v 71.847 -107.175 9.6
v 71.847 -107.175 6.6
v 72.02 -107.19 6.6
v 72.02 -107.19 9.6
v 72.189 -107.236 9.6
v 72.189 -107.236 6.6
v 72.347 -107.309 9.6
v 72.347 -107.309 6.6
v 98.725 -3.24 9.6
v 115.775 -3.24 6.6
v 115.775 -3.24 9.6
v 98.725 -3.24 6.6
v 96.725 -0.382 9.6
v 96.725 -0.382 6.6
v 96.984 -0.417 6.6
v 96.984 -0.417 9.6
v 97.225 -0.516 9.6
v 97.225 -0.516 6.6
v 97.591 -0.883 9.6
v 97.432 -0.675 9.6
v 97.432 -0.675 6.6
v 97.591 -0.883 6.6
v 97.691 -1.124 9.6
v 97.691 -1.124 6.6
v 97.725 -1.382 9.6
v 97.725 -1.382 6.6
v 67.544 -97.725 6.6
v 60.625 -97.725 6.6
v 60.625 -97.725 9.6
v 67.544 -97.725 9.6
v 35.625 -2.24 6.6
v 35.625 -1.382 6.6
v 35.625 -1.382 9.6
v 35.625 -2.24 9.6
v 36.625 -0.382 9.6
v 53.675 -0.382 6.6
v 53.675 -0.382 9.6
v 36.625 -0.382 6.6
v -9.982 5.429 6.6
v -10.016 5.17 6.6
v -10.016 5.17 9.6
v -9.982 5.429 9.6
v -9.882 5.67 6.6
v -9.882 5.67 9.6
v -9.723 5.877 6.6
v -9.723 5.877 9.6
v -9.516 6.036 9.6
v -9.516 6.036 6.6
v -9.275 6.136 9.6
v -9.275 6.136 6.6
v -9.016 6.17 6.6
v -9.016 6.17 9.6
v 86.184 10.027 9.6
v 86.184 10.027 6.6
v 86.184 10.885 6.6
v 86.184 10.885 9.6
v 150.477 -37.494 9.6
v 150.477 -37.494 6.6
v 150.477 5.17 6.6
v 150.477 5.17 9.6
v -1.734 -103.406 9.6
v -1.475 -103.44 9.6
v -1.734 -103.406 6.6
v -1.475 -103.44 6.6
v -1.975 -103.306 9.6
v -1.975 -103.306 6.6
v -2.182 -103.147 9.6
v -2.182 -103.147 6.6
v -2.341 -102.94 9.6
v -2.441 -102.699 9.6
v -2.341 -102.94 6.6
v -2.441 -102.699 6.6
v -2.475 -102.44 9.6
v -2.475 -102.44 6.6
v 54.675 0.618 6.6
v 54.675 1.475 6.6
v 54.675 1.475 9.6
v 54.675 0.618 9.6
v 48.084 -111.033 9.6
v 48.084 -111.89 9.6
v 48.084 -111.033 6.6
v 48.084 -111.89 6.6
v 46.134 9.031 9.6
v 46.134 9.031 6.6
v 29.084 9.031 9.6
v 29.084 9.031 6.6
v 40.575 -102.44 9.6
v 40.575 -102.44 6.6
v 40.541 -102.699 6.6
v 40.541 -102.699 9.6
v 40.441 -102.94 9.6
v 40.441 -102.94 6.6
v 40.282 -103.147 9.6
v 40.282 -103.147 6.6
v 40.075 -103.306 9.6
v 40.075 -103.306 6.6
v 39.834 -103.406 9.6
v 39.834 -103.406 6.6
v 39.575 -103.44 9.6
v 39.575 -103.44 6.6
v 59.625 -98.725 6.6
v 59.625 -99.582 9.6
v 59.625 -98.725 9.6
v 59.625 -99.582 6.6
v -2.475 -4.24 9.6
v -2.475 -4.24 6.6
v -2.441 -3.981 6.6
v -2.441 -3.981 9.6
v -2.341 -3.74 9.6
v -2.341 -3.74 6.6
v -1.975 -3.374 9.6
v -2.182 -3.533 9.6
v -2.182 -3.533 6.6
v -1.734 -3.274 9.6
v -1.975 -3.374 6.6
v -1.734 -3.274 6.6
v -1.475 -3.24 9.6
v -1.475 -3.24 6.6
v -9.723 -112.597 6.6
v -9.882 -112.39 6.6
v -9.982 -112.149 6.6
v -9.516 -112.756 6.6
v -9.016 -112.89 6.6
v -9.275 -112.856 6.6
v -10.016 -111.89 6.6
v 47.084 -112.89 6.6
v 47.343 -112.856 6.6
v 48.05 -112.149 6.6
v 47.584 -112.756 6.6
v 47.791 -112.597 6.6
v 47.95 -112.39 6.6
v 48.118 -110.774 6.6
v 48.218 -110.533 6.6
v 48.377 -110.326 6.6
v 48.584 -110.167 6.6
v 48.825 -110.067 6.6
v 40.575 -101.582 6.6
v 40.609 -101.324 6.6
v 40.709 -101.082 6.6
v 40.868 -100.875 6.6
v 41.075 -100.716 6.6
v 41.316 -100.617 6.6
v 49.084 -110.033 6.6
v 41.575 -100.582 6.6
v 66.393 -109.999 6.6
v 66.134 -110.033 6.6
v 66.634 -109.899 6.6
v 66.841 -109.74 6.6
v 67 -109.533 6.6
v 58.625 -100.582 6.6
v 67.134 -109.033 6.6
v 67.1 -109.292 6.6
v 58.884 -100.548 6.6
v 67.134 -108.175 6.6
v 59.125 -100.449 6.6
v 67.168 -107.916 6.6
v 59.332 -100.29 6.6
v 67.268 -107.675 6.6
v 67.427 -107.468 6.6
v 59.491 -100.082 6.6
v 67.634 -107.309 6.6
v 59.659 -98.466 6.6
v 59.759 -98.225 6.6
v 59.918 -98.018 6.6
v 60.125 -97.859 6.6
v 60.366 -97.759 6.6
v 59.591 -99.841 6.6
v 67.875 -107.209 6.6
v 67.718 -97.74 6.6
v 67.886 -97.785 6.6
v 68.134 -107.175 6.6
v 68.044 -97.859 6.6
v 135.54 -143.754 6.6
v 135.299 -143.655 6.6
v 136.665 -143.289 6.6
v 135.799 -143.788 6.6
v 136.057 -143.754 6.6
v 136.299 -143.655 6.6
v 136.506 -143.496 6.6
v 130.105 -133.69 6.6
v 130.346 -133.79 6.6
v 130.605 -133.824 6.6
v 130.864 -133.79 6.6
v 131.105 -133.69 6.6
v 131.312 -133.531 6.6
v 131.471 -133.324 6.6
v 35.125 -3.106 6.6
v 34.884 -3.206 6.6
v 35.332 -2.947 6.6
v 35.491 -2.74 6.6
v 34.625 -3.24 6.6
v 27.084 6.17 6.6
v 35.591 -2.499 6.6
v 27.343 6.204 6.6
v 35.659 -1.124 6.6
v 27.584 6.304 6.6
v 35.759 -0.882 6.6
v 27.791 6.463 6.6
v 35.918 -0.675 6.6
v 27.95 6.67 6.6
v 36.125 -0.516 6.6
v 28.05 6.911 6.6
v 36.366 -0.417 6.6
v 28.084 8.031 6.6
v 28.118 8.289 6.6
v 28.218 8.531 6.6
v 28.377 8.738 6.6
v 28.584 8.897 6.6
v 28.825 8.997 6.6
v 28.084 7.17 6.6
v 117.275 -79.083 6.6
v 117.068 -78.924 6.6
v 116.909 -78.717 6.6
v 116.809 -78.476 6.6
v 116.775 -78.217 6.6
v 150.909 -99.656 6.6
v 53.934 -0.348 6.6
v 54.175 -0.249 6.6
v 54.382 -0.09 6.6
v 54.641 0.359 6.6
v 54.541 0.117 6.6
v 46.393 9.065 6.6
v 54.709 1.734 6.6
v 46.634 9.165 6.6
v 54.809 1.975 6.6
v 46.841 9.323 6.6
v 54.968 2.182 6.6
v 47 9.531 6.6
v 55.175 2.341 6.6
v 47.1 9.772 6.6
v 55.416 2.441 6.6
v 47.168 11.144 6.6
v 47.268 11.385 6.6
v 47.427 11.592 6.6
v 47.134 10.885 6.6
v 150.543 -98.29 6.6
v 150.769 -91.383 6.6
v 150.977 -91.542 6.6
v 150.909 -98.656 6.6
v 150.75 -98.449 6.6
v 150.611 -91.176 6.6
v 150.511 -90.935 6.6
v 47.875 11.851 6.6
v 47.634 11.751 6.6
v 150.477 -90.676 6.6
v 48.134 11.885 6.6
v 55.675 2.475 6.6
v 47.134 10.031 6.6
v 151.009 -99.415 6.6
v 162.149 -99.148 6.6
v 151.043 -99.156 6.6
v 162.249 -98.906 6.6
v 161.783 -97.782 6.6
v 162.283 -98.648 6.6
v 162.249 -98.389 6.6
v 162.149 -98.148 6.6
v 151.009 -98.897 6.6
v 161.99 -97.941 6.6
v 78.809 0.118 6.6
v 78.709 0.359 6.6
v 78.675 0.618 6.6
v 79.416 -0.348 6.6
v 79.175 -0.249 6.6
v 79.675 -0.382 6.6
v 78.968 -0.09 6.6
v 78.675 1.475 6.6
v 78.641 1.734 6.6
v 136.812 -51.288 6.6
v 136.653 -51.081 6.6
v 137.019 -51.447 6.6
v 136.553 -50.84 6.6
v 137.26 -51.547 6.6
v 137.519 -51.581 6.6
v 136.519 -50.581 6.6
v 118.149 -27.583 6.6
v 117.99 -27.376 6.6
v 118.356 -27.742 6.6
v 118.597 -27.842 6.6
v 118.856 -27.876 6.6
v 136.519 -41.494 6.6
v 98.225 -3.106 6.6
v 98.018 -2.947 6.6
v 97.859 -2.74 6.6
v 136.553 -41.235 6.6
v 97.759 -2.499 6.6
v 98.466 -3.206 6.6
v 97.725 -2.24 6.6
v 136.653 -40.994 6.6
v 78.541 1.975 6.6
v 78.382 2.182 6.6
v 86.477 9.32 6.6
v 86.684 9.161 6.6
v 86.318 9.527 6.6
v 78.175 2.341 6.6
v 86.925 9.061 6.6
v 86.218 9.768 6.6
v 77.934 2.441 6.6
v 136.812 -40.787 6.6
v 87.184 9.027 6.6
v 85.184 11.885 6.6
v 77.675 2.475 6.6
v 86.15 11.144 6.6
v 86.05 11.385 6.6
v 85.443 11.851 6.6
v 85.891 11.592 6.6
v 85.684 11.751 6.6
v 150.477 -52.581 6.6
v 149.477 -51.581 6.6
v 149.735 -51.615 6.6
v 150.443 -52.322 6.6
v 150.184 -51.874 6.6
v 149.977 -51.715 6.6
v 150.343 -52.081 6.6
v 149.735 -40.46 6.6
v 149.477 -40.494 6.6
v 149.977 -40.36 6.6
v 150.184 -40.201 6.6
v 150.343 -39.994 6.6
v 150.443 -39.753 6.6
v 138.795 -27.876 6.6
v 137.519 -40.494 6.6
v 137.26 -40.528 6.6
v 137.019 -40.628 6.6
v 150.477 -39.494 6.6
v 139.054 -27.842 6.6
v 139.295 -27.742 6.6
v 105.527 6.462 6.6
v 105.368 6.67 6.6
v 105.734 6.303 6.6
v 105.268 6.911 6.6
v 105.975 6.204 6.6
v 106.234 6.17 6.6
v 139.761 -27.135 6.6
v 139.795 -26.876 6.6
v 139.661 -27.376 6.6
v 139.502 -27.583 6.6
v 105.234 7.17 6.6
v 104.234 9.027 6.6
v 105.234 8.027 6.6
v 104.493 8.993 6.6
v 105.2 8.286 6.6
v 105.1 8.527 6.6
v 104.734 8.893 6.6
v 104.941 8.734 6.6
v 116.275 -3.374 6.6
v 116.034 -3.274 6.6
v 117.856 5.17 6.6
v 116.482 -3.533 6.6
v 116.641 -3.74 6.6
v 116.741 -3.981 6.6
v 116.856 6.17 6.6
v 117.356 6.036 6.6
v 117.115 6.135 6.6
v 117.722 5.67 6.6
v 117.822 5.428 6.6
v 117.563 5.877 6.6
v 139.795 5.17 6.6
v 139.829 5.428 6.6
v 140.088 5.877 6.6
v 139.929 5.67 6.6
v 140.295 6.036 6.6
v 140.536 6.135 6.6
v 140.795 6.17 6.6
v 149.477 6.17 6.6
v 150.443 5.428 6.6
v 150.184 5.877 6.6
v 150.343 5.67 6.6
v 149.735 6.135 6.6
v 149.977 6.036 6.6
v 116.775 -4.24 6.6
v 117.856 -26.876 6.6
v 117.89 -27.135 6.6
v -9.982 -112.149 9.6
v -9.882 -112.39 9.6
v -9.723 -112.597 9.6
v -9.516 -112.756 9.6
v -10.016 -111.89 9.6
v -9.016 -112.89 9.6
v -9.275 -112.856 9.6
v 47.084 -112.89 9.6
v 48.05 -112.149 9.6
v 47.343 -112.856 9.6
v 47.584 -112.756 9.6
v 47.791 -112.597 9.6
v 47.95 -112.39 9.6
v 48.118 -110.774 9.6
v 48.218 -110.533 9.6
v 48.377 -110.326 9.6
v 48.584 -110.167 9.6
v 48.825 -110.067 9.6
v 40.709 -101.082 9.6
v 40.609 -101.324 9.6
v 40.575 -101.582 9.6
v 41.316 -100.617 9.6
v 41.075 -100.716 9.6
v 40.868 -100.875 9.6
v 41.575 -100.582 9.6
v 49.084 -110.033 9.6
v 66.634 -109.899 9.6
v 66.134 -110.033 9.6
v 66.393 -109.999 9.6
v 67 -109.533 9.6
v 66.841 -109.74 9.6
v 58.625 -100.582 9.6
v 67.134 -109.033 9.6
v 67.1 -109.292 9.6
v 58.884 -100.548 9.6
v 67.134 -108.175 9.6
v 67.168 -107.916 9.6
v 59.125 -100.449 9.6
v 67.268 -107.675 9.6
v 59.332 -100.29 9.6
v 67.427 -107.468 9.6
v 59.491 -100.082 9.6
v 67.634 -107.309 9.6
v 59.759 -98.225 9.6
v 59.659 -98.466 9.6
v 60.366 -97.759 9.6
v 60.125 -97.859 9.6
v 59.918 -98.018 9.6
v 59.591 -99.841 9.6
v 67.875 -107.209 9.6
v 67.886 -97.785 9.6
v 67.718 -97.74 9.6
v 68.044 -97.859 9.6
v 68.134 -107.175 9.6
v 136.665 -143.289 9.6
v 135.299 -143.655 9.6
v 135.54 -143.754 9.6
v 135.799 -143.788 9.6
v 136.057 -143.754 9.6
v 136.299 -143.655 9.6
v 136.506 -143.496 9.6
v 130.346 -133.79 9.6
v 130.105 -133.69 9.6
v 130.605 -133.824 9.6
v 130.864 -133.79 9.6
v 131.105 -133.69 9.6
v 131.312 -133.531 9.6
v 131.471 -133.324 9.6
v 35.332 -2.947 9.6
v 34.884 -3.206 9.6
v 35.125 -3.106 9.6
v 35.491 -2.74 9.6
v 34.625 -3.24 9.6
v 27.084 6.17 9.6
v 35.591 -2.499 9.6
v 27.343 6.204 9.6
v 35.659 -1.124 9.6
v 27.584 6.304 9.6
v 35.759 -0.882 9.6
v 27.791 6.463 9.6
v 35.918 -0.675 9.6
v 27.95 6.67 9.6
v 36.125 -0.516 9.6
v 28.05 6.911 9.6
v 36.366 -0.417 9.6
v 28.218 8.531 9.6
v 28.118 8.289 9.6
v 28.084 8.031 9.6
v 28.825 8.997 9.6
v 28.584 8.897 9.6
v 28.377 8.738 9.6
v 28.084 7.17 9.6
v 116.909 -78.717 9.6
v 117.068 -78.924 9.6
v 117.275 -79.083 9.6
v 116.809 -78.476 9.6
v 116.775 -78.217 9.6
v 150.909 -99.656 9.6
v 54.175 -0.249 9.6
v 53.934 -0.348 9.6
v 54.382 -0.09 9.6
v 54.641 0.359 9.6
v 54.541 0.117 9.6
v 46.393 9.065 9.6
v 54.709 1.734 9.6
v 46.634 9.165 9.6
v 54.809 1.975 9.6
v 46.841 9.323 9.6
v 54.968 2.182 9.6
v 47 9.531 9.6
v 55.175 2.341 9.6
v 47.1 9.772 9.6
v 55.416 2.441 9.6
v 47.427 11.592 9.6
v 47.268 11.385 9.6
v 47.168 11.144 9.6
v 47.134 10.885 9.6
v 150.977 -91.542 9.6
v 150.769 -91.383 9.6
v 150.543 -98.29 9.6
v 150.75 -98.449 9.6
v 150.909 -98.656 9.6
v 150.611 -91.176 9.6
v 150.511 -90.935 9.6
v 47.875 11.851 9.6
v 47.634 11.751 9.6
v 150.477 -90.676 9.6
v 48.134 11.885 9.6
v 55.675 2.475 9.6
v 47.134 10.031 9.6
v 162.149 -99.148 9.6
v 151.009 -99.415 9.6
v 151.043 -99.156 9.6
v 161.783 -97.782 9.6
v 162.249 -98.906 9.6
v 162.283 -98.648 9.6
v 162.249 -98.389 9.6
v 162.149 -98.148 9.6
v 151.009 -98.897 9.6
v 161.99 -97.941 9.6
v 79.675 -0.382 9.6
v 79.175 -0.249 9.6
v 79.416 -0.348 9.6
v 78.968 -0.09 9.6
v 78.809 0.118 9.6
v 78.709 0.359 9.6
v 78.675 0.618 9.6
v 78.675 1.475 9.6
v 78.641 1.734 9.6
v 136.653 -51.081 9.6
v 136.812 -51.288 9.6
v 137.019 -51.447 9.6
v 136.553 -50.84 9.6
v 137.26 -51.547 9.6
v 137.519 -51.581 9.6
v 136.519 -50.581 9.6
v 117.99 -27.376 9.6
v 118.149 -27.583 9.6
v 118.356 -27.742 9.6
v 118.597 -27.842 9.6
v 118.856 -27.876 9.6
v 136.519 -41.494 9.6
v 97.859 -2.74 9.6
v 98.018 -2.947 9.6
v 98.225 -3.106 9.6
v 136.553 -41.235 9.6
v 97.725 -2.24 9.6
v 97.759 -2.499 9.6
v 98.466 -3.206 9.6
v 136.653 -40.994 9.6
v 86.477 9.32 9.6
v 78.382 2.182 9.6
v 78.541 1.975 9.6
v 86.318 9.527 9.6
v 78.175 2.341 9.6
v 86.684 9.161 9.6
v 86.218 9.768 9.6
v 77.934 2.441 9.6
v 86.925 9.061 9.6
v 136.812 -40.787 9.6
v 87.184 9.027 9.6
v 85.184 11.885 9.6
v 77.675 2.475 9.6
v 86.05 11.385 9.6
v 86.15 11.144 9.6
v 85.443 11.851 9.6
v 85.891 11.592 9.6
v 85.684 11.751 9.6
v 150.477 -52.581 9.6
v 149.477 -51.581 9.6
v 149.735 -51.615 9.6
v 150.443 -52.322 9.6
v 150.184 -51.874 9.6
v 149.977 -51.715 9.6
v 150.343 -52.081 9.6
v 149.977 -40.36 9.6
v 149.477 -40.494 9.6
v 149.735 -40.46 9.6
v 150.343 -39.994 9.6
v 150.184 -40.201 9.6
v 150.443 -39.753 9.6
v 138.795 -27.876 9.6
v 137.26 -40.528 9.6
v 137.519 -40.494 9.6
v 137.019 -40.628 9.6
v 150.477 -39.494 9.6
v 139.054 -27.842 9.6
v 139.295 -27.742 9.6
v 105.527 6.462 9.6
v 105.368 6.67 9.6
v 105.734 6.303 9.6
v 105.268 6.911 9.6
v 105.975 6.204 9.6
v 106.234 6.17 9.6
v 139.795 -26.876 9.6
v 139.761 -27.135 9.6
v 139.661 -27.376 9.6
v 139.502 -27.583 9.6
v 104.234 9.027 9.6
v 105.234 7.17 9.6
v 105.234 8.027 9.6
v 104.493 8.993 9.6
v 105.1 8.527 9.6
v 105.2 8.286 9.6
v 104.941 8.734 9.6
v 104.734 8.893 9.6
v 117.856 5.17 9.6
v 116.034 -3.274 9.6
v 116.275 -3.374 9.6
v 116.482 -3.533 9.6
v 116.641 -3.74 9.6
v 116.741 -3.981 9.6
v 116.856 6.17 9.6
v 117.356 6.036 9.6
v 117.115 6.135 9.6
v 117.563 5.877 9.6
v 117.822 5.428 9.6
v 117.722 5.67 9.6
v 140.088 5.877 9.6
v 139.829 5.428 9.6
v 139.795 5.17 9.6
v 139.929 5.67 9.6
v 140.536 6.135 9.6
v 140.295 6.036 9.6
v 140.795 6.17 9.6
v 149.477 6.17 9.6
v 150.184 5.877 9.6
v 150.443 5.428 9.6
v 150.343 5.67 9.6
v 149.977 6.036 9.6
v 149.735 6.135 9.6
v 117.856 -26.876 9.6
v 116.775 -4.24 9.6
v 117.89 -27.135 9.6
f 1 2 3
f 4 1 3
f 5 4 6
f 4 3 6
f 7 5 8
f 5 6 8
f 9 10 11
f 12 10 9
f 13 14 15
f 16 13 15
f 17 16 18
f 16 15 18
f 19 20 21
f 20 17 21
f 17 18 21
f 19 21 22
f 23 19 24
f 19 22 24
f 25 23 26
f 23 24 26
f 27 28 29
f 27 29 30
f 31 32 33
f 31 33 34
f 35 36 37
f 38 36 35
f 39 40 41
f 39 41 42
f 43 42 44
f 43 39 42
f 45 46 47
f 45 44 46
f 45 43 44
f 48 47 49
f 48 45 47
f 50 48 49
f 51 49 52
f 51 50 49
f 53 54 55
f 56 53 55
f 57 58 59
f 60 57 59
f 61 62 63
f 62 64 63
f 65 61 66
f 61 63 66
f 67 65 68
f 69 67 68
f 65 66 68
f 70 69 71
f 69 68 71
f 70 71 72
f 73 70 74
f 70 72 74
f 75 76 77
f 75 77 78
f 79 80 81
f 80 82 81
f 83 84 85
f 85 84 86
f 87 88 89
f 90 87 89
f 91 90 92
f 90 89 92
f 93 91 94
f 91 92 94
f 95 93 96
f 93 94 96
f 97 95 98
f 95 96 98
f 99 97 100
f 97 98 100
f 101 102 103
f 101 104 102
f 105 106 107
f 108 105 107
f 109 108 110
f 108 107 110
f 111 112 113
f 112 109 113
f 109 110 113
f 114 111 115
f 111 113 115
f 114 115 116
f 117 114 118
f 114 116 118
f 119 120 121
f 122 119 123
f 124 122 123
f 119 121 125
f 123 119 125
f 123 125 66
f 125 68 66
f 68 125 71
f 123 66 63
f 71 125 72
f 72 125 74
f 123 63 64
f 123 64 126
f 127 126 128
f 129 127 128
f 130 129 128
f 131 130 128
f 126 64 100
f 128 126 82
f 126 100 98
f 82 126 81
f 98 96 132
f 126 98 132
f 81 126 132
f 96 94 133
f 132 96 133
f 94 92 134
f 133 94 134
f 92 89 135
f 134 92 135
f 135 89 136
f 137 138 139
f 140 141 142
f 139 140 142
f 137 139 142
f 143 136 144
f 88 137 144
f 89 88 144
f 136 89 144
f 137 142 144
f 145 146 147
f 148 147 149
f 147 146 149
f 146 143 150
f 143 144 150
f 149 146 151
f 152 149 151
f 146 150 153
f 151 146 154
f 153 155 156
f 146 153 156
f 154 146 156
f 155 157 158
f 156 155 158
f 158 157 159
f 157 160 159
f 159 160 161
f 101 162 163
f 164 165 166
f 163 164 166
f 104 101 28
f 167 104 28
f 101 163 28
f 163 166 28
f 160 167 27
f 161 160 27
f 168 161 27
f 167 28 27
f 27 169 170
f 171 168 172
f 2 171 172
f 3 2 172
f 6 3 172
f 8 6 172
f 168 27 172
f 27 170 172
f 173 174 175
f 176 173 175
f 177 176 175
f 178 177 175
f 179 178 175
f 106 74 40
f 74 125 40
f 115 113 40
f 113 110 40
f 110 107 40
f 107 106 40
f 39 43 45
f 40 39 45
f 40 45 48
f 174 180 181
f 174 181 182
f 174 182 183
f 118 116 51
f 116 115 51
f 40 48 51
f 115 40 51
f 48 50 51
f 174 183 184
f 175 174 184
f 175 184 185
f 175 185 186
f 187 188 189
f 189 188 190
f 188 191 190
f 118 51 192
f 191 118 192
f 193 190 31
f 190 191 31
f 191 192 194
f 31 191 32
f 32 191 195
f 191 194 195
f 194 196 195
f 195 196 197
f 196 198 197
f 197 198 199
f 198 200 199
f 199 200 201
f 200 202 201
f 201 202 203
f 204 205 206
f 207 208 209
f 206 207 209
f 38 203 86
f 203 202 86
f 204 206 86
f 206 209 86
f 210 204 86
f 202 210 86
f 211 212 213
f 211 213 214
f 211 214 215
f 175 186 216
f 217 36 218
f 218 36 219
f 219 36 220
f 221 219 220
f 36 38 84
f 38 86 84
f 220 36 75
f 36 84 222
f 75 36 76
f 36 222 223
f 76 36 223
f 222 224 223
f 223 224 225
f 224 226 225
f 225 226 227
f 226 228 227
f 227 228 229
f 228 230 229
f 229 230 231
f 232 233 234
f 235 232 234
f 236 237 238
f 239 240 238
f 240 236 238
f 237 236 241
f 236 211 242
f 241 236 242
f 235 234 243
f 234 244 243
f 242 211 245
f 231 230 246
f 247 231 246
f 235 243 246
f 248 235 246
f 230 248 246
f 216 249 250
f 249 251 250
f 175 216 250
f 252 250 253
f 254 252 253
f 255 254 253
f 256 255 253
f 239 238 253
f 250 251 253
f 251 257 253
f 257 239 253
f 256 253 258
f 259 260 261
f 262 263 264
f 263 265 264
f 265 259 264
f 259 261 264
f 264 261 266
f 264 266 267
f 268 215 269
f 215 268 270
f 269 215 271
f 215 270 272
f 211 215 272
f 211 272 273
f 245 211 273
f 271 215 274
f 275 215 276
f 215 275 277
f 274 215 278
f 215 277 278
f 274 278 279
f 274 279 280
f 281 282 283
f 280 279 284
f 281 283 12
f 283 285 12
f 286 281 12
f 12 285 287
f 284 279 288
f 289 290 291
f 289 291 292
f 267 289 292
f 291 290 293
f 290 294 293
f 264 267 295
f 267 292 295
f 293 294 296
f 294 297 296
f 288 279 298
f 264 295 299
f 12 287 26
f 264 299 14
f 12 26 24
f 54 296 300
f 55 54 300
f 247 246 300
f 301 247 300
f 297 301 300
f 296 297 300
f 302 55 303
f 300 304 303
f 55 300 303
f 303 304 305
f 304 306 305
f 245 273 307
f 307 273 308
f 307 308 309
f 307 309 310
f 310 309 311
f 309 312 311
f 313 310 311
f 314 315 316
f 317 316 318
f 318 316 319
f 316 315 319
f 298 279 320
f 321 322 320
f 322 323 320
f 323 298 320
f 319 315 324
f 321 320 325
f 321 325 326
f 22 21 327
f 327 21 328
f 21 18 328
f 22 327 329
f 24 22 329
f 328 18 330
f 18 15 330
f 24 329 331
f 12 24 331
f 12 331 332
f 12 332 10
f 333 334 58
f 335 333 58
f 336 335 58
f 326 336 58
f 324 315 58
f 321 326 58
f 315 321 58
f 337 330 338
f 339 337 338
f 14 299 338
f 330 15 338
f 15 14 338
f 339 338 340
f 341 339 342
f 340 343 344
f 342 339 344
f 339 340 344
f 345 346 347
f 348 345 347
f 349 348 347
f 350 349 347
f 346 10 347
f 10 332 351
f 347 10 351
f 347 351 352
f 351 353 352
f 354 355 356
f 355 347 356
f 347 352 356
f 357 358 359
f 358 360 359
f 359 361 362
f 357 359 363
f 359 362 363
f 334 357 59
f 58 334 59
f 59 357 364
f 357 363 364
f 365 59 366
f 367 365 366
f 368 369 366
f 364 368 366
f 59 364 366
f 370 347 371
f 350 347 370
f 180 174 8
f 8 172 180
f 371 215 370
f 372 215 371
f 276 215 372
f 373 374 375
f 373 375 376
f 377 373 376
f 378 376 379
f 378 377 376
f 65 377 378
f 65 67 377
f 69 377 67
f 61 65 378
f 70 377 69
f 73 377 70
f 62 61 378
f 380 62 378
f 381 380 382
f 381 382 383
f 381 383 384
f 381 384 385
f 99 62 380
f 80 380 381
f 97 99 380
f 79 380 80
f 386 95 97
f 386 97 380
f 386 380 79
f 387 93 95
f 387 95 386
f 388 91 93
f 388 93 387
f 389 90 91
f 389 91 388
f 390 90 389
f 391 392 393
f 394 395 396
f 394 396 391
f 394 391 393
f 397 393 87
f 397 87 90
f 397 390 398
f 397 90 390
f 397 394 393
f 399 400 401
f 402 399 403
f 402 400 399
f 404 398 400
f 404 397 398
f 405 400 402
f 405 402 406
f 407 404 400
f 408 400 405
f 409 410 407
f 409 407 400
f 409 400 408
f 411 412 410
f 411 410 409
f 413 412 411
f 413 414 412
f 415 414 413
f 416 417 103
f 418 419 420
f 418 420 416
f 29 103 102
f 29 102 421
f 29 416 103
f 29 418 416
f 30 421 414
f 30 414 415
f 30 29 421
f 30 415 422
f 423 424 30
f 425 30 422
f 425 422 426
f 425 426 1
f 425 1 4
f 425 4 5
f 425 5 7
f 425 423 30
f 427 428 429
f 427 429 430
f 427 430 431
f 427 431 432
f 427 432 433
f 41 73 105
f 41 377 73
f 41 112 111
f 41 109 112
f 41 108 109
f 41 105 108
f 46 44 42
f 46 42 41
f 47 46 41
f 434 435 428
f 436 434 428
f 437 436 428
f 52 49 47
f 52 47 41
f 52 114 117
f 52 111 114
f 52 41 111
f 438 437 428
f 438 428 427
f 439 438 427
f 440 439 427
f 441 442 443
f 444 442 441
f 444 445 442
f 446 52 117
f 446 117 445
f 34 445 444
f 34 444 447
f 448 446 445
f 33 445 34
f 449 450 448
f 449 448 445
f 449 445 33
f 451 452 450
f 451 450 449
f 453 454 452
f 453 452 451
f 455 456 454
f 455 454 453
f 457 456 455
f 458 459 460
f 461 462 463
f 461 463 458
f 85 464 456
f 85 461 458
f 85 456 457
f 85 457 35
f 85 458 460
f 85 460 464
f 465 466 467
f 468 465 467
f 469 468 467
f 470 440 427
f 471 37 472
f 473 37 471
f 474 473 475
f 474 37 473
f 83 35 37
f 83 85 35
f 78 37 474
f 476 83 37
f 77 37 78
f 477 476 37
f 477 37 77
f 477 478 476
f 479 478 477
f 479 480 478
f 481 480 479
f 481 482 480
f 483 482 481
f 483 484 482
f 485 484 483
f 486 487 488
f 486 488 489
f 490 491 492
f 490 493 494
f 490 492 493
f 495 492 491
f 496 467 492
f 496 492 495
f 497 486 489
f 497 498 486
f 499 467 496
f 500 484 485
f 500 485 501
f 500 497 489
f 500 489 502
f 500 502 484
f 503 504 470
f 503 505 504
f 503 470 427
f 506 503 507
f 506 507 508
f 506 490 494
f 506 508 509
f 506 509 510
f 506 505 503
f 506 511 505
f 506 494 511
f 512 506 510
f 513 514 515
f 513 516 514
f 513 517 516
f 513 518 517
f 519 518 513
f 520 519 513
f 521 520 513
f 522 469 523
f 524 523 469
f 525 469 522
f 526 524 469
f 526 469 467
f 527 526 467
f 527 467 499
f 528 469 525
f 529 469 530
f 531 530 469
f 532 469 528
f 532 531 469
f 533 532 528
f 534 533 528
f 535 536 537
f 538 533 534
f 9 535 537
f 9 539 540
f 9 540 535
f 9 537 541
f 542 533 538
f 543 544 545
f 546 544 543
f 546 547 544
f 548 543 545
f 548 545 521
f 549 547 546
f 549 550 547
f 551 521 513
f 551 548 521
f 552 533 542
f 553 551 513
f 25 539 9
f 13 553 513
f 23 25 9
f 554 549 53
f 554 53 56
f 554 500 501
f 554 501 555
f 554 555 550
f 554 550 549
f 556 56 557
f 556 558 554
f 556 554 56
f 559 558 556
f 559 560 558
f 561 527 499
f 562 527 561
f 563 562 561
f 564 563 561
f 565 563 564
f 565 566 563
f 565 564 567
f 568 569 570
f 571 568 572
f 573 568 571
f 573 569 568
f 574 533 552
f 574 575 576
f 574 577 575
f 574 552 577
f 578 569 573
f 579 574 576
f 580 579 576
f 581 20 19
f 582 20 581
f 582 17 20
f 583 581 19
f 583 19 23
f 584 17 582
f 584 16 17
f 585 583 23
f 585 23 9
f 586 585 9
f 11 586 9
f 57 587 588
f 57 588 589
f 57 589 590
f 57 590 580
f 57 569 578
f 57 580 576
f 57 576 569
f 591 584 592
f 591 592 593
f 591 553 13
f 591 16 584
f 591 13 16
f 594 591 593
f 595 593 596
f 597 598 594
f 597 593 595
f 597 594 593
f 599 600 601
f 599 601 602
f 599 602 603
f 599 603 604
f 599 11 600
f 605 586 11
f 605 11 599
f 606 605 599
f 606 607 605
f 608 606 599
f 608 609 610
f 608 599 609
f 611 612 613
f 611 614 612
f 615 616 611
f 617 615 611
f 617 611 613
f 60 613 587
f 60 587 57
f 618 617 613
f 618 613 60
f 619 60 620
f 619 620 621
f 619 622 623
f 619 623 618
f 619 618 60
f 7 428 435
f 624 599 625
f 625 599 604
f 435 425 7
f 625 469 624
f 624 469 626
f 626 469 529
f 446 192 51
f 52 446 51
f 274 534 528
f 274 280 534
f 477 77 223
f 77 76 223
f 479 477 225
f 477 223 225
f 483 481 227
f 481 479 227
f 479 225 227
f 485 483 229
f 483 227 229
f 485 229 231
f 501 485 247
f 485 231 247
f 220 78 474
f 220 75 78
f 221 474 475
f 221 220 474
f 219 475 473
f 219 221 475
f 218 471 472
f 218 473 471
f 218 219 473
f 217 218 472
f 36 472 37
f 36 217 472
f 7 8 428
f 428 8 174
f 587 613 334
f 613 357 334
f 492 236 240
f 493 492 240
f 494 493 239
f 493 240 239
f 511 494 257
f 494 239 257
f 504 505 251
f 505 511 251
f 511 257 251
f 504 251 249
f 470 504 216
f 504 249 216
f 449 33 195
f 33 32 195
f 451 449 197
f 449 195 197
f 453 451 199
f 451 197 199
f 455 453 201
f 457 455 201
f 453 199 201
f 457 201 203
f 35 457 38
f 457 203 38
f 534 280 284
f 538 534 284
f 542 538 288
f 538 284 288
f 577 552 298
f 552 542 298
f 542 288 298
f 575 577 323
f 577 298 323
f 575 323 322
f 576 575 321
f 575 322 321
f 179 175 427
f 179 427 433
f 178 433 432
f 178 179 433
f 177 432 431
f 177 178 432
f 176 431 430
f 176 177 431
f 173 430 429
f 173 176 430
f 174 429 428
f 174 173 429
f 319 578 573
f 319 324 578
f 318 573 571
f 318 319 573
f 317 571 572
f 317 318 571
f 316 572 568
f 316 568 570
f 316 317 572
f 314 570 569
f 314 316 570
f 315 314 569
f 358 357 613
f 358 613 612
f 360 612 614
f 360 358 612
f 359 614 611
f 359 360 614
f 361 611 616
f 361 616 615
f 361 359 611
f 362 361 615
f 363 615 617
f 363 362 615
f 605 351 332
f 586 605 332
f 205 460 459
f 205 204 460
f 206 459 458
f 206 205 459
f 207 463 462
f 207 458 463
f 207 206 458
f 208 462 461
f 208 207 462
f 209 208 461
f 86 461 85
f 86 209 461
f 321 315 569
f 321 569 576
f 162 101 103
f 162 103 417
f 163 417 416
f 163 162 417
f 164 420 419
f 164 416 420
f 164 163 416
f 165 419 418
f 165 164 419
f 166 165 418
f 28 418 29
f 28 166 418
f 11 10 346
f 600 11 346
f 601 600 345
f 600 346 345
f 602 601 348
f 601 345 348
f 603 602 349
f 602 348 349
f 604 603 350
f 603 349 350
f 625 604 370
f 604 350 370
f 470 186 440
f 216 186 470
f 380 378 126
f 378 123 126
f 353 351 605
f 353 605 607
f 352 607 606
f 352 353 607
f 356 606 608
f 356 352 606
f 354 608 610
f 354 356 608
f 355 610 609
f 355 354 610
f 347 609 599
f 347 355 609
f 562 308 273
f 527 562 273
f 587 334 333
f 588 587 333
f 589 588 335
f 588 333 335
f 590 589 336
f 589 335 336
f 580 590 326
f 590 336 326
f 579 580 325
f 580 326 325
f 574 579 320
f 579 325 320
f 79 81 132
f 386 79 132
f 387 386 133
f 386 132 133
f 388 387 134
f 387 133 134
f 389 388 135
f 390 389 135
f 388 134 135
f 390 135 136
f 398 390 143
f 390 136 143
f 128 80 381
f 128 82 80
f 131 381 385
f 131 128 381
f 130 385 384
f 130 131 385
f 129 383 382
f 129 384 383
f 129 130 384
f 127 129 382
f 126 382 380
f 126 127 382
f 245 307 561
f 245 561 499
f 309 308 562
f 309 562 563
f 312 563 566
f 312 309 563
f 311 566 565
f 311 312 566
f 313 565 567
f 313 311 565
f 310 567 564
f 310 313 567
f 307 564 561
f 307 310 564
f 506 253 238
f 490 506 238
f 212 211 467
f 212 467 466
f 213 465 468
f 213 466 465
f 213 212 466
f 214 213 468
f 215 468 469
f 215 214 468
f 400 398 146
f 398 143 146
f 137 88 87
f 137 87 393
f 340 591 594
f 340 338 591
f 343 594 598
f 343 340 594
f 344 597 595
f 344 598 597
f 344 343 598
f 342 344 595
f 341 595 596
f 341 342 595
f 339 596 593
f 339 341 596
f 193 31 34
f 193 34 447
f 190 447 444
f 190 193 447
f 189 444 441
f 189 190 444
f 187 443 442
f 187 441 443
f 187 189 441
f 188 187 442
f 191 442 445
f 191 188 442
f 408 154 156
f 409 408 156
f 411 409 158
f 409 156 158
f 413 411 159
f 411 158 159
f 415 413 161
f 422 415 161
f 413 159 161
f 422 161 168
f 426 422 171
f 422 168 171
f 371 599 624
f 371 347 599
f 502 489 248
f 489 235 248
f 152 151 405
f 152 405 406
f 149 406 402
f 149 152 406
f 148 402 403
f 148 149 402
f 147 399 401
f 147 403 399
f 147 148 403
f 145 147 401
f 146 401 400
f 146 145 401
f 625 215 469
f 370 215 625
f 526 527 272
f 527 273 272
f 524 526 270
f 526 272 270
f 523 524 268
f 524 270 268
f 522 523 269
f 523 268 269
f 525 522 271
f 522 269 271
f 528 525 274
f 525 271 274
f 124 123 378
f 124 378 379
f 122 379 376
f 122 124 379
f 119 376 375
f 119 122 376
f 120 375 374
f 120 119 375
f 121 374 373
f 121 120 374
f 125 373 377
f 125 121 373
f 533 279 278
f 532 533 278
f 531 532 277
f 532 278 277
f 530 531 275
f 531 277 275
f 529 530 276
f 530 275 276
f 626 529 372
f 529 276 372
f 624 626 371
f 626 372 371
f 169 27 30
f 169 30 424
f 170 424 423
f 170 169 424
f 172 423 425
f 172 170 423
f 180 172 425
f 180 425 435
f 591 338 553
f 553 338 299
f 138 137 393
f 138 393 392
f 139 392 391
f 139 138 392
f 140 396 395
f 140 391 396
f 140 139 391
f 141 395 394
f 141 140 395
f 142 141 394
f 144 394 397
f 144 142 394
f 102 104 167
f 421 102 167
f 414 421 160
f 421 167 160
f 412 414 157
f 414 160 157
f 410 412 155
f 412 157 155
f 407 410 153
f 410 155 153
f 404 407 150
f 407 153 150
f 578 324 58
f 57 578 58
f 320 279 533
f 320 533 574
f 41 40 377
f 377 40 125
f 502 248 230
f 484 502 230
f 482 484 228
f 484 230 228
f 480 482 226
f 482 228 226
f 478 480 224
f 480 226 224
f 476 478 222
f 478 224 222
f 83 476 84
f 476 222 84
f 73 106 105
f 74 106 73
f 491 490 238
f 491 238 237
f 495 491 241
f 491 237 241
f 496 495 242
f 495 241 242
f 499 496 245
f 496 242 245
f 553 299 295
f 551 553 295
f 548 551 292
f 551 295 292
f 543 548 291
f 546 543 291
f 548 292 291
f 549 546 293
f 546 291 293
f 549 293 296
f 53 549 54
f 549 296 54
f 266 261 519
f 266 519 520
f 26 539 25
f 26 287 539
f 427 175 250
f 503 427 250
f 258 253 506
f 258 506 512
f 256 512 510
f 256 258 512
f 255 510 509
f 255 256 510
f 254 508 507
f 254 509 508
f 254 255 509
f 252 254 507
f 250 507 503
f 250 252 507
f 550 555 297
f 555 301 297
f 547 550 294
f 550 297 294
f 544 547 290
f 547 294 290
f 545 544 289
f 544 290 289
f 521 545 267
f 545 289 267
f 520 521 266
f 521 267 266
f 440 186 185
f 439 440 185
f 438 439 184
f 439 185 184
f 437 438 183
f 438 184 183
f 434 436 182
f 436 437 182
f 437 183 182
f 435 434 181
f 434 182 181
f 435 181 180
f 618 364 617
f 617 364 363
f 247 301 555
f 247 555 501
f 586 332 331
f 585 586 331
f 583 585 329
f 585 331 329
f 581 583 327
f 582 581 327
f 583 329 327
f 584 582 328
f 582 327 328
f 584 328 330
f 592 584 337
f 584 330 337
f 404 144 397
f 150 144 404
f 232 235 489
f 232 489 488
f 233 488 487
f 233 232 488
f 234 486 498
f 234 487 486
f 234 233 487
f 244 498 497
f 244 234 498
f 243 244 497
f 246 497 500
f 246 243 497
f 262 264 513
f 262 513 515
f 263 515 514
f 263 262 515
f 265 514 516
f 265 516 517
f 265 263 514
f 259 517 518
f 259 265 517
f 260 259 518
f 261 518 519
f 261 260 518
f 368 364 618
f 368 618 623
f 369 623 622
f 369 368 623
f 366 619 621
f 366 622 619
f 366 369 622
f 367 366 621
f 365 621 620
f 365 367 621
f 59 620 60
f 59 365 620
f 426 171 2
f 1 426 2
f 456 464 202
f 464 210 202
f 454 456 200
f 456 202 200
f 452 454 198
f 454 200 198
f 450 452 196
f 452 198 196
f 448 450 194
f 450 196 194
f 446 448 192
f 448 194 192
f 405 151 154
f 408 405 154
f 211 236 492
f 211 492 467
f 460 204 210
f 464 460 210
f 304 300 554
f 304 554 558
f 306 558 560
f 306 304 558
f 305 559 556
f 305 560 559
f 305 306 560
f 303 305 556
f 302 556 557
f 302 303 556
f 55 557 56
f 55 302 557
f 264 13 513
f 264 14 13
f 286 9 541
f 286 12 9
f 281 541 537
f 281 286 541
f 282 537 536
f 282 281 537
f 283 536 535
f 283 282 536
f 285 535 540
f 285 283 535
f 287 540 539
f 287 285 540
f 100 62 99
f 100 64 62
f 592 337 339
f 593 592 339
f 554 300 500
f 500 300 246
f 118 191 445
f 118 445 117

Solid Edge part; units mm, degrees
sketch "Sketch1" plane through (0, 0, 6.6) normal (0, 0, 1) x (1, 0, 0)
  line L0 (149.4766, 6.1695) -> (106.2339, 6.1695)
  arc A0 (106.2339, 6.1695) -> (105.2339, 7.1695) centre (106.2339, 7.1695) cw
  line L1 (105.2339, 7.1695) -> (105.2339, 8.0272)
  arc A1 (105.2339, 8.0272) -> (104.2339, 9.0272) centre (104.2339, 8.0272) ccw
  line L2 (104.2339, 9.0272) -> (87.1839, 9.0272)
  arc A2 (87.1839, 9.0272) -> (86.1839, 10.0272) centre (87.1839, 10.0272) cw
  line L3 (86.1839, 10.0272) -> (86.1839, 10.8847)
  arc A3 (86.1839, 10.8847) -> (85.1839, 11.8847) centre (85.1839, 10.8847) ccw
  line L4 (85.1839, 11.8847) -> (48.1339, 11.8847)
  arc A4 (48.1339, 11.8847) -> (47.1339, 10.8847) centre (48.1339, 10.8847) ccw
  line L5 (47.1339, 10.8847) -> (47.1339, 10.0306)
  arc A5 (47.1339, 10.0306) -> (46.1339, 9.0306) centre (46.1339, 10.0306) cw
  line L6 (46.1339, 9.0306) -> (29.0839, 9.0306)
  arc A6 (29.0839, 9.0306) -> (28.0839, 8.0306) centre (29.0839, 8.0306) ccw
  line L7 (28.0839, 8.0306) -> (28.0839, 7.1697)
  arc A7 (28.0839, 7.1697) -> (27.0839, 6.1697) centre (27.0839, 7.1697) cw
  line L8 (27.0839, 6.1697) -> (-9.0161, 6.1697)
  arc A8 (-9.0161, 6.1697) -> (-10.0161, 5.1697) centre (-9.0161, 5.1697) ccw
  line L9 (-10.0161, 5.1697) -> (-10.0161, -111.8903)
  arc A9 (-10.0161, -111.8903) -> (-9.0161, -112.8903) centre (-9.0161, -111.8903) ccw
  line L10 (-9.0161, -112.8903) -> (47.0839, -112.8903)
  arc A10 (47.0839, -112.8903) -> (48.0839, -111.8903) centre (47.0839, -111.8903) ccw
  line L11 (48.0839, -111.8903) -> (48.0839, -111.0328)
  arc A11 (48.0839, -111.0328) -> (49.0839, -110.0328) centre (49.0839, -111.0328) cw
  line L12 (49.0839, -110.0328) -> (66.1339, -110.0328)
  arc A12 (66.1339, -110.0328) -> (67.1339, -109.0328) centre (66.1339, -109.0328) ccw
  line L13 (67.1339, -109.0328) -> (67.1339, -108.1753)
  arc A13 (67.1339, -108.1753) -> (68.1339, -107.1753) centre (68.1339, -108.1753) cw
  line L14 (68.1339, -107.1753) -> (71.8467, -107.1753)
  arc A14 (71.8467, -107.1753) -> (72.3467, -107.3093) centre (71.8467, -108.1753) cw
  line L15 (72.3467, -107.3093) -> (135.2985, -143.6546)
  arc A15 (135.2985, -143.6545) -> (136.6645, -143.2885) centre (135.7985, -142.7885) ccw
  line L16 (136.6646, -143.2885) -> (162.1493, -99.1476)
  arc A16 (162.1493, -99.1476) -> (161.7833, -97.7816) centre (161.2833, -98.6476) ccw
  line L17 (161.7833, -97.7816) -> (150.9766, -91.5423)
  arc A17 (150.9766, -91.5423) -> (150.4766, -90.6763) centre (151.4766, -90.6763) cw
  line L18 (150.4766, -90.6763) -> (150.4766, 5.1695)
  arc A18 (150.4766, 5.1695) -> (149.4766, 6.1695) centre (149.4766, 5.1695) ccw
extrude "Protrusion1" add sketch "Sketch1" along normal blind 3
sketch "Sketch2" plane through (76.1334, -65.9517, 6.6) normal (0, 0, 1) x (1, 0, 0)
  line L0 (39.6416, 62.7117) -> (22.5916, 62.7117)
  arc A0 (21.5916, 63.7117) -> (22.5916, 62.7117) centre (22.5916, 63.7117) ccw
  line L1 (21.5916, 63.7117) -> (21.5916, 64.5692)
  arc A1 (21.5916, 64.5692) -> (20.5916, 65.5692) centre (20.5916, 64.5692) ccw
  line L2 (20.5916, 65.5692) -> (3.5416, 65.5692)
  arc A2 (3.5416, 65.5692) -> (2.5416, 66.5692) centre (3.5416, 66.5692) cw
  line L3 (2.5416, 66.5692) -> (2.5416, 67.4267)
  arc A3 (1.5416, 68.4267) -> (2.5416, 67.4267) centre (1.5416, 67.4267) cw
  line L4 (1.5416, 68.4267) -> (-20.4584, 68.4267)
  arc A4 (-20.4584, 68.4267) -> (-21.4584, 67.4267) centre (-20.4584, 67.4267) ccw
  line L5 (-21.4584, 67.4267) -> (-21.4584, 66.5692)
  arc A5 (-22.4584, 65.5692) -> (-21.4584, 66.5692) centre (-22.4584, 66.5692) ccw
  line L6 (-22.4584, 65.5692) -> (-39.5084, 65.5692)
  arc A6 (-40.5084, 64.5692) -> (-39.5084, 65.5692) centre (-39.5084, 64.5692) cw
  line L7 (-40.5084, 64.5692) -> (-40.5084, 63.7117)
  arc A7 (-41.5084, 62.7117) -> (-40.5084, 63.7117) centre (-41.5084, 63.7117) ccw
  line L8 (-41.5084, 62.7117) -> (-77.6084, 62.7117)
  arc A8 (-77.6084, 62.7117) -> (-78.6084, 61.7117) centre (-77.6084, 61.7117) ccw
  line L9 (-78.6084, 61.7117) -> (-78.6084, -36.4883)
  arc A9 (-77.6084, -37.4883) -> (-78.6084, -36.4883) centre (-77.6084, -36.4883) cw
  line L10 (-77.6084, -37.4883) -> (-36.5584, -37.4883)
  arc A10 (-35.5584, -36.4883) -> (-36.5584, -37.4883) centre (-36.5584, -36.4883) cw
  line L11 (-35.5584, -36.4883) -> (-35.5584, -35.6308)
  arc A11 (-34.5584, -34.6308) -> (-35.5584, -35.6308) centre (-34.5584, -35.6308) ccw
  line L12 (-34.5584, -34.6308) -> (-17.5084, -34.6308)
  arc A12 (-16.5084, -33.6308) -> (-17.5084, -34.6308) centre (-17.5084, -33.6308) cw
  line L13 (-16.5084, -33.6308) -> (-16.5084, -32.7733)
  arc A13 (-15.5084, -31.7733) -> (-16.5084, -32.7733) centre (-15.5084, -32.7733) ccw
  line L14 (-15.5084, -31.7733) -> (-8.5892, -31.7733)
  arc A14 (-8.5892, -31.7733) -> (-8.0892, -31.9072) centre (-8.5892, -32.7733) cw
  line L15 (-8.0892, -31.9073) -> (53.9717, -67.7381)
  arc A15 (53.9717, -67.7381) -> (55.3377, -67.3721) centre (54.4717, -66.8721) ccw
  line L16 (55.3377, -67.3721) -> (74.7757, -33.7045)
  arc A16 (74.7757, -33.7045) -> (74.4097, -32.3384) centre (73.9097, -33.2045) ccw
  line L17 (74.4097, -32.3385) -> (41.1416, -13.1311)
  arc A17 (40.6416, -12.2651) -> (41.1416, -13.1311) centre (41.6416, -12.2651) ccw
  line L18 (40.6416, -12.2651) -> (40.6416, 61.7117)
  arc A18 (39.6416, 62.7117) -> (40.6416, 61.7117) centre (39.6416, 61.7117) cw
extrude "ExtrudedCutout_1" cut sketch "Sketch2" along normal blind 3
sketch "Sketch3" plane through (76.1336, -65.9519, 6.6) normal (0, 0, 1) x (1, 0, 0)
  line L0 (63.6614, 71.1214) -> (63.6614, 39.0756)
  arc A0 (63.6614, 39.0756) -> (62.6614, 38.0756) centre (62.6614, 39.0756) cw
  line L1 (42.7226, 38.0757) -> (62.6614, 38.0756)
  arc A1 (41.7226, 39.0757) -> (42.7226, 38.0757) centre (42.7226, 39.0757) ccw
  line L2 (41.7226, 71.1214) -> (41.7226, 39.0757)
  arc A2 (40.7226, 72.1214) -> (41.7226, 71.1214) centre (40.7226, 71.1214) cw
  line L3 (40.7226, 72.1214) -> (38.7226, 72.1214)
  line L4 (38.7226, 72.1214) -> (38.7226, 76.1215)
  line L5 (66.6614, 76.1215) -> (38.7226, 76.1215)
  line L6 (66.6614, 72.1214) -> (66.6614, 76.1215)
  line L7 (64.6614, 72.1214) -> (66.6614, 72.1214)
  arc A3 (63.6614, 71.1214) -> (64.6614, 72.1214) centre (64.6614, 71.1214) cw
  line L8 (60.3851, 24.4582) -> (60.3851, 15.3706)
  arc A4 (60.3851, 15.3706) -> (61.3851, 14.3706) centre (61.3851, 15.3706) ccw
  line L9 (73.343, 14.3706) -> (61.3851, 14.3706)
  arc A5 (73.343, 14.3706) -> (74.343, 13.3706) centre (73.343, 13.3706) cw
  line L10 (74.343, 13.3706) -> (74.343, 11.3706)
  line L11 (74.343, 11.3706) -> (78.343, 11.3706)
  line L12 (78.343, 11.3706) -> (78.343, 28.4581)
  line L13 (74.343, 28.4581) -> (78.343, 28.4581)
  line L14 (74.343, 26.4581) -> (74.343, 28.4581)
  arc A6 (74.343, 26.4581) -> (73.343, 25.4582) centre (73.343, 26.4582) cw
  line L15 (73.343, 25.4582) -> (61.3851, 25.4582)
  arc A7 (61.3851, 25.4582) -> (60.3851, 24.4582) centre (61.3851, 24.4582) ccw
extrude "ExtrudedCutout_2" cut sketch "Sketch3" along normal blind 3
properties material "ABS Plastic, high impact"
